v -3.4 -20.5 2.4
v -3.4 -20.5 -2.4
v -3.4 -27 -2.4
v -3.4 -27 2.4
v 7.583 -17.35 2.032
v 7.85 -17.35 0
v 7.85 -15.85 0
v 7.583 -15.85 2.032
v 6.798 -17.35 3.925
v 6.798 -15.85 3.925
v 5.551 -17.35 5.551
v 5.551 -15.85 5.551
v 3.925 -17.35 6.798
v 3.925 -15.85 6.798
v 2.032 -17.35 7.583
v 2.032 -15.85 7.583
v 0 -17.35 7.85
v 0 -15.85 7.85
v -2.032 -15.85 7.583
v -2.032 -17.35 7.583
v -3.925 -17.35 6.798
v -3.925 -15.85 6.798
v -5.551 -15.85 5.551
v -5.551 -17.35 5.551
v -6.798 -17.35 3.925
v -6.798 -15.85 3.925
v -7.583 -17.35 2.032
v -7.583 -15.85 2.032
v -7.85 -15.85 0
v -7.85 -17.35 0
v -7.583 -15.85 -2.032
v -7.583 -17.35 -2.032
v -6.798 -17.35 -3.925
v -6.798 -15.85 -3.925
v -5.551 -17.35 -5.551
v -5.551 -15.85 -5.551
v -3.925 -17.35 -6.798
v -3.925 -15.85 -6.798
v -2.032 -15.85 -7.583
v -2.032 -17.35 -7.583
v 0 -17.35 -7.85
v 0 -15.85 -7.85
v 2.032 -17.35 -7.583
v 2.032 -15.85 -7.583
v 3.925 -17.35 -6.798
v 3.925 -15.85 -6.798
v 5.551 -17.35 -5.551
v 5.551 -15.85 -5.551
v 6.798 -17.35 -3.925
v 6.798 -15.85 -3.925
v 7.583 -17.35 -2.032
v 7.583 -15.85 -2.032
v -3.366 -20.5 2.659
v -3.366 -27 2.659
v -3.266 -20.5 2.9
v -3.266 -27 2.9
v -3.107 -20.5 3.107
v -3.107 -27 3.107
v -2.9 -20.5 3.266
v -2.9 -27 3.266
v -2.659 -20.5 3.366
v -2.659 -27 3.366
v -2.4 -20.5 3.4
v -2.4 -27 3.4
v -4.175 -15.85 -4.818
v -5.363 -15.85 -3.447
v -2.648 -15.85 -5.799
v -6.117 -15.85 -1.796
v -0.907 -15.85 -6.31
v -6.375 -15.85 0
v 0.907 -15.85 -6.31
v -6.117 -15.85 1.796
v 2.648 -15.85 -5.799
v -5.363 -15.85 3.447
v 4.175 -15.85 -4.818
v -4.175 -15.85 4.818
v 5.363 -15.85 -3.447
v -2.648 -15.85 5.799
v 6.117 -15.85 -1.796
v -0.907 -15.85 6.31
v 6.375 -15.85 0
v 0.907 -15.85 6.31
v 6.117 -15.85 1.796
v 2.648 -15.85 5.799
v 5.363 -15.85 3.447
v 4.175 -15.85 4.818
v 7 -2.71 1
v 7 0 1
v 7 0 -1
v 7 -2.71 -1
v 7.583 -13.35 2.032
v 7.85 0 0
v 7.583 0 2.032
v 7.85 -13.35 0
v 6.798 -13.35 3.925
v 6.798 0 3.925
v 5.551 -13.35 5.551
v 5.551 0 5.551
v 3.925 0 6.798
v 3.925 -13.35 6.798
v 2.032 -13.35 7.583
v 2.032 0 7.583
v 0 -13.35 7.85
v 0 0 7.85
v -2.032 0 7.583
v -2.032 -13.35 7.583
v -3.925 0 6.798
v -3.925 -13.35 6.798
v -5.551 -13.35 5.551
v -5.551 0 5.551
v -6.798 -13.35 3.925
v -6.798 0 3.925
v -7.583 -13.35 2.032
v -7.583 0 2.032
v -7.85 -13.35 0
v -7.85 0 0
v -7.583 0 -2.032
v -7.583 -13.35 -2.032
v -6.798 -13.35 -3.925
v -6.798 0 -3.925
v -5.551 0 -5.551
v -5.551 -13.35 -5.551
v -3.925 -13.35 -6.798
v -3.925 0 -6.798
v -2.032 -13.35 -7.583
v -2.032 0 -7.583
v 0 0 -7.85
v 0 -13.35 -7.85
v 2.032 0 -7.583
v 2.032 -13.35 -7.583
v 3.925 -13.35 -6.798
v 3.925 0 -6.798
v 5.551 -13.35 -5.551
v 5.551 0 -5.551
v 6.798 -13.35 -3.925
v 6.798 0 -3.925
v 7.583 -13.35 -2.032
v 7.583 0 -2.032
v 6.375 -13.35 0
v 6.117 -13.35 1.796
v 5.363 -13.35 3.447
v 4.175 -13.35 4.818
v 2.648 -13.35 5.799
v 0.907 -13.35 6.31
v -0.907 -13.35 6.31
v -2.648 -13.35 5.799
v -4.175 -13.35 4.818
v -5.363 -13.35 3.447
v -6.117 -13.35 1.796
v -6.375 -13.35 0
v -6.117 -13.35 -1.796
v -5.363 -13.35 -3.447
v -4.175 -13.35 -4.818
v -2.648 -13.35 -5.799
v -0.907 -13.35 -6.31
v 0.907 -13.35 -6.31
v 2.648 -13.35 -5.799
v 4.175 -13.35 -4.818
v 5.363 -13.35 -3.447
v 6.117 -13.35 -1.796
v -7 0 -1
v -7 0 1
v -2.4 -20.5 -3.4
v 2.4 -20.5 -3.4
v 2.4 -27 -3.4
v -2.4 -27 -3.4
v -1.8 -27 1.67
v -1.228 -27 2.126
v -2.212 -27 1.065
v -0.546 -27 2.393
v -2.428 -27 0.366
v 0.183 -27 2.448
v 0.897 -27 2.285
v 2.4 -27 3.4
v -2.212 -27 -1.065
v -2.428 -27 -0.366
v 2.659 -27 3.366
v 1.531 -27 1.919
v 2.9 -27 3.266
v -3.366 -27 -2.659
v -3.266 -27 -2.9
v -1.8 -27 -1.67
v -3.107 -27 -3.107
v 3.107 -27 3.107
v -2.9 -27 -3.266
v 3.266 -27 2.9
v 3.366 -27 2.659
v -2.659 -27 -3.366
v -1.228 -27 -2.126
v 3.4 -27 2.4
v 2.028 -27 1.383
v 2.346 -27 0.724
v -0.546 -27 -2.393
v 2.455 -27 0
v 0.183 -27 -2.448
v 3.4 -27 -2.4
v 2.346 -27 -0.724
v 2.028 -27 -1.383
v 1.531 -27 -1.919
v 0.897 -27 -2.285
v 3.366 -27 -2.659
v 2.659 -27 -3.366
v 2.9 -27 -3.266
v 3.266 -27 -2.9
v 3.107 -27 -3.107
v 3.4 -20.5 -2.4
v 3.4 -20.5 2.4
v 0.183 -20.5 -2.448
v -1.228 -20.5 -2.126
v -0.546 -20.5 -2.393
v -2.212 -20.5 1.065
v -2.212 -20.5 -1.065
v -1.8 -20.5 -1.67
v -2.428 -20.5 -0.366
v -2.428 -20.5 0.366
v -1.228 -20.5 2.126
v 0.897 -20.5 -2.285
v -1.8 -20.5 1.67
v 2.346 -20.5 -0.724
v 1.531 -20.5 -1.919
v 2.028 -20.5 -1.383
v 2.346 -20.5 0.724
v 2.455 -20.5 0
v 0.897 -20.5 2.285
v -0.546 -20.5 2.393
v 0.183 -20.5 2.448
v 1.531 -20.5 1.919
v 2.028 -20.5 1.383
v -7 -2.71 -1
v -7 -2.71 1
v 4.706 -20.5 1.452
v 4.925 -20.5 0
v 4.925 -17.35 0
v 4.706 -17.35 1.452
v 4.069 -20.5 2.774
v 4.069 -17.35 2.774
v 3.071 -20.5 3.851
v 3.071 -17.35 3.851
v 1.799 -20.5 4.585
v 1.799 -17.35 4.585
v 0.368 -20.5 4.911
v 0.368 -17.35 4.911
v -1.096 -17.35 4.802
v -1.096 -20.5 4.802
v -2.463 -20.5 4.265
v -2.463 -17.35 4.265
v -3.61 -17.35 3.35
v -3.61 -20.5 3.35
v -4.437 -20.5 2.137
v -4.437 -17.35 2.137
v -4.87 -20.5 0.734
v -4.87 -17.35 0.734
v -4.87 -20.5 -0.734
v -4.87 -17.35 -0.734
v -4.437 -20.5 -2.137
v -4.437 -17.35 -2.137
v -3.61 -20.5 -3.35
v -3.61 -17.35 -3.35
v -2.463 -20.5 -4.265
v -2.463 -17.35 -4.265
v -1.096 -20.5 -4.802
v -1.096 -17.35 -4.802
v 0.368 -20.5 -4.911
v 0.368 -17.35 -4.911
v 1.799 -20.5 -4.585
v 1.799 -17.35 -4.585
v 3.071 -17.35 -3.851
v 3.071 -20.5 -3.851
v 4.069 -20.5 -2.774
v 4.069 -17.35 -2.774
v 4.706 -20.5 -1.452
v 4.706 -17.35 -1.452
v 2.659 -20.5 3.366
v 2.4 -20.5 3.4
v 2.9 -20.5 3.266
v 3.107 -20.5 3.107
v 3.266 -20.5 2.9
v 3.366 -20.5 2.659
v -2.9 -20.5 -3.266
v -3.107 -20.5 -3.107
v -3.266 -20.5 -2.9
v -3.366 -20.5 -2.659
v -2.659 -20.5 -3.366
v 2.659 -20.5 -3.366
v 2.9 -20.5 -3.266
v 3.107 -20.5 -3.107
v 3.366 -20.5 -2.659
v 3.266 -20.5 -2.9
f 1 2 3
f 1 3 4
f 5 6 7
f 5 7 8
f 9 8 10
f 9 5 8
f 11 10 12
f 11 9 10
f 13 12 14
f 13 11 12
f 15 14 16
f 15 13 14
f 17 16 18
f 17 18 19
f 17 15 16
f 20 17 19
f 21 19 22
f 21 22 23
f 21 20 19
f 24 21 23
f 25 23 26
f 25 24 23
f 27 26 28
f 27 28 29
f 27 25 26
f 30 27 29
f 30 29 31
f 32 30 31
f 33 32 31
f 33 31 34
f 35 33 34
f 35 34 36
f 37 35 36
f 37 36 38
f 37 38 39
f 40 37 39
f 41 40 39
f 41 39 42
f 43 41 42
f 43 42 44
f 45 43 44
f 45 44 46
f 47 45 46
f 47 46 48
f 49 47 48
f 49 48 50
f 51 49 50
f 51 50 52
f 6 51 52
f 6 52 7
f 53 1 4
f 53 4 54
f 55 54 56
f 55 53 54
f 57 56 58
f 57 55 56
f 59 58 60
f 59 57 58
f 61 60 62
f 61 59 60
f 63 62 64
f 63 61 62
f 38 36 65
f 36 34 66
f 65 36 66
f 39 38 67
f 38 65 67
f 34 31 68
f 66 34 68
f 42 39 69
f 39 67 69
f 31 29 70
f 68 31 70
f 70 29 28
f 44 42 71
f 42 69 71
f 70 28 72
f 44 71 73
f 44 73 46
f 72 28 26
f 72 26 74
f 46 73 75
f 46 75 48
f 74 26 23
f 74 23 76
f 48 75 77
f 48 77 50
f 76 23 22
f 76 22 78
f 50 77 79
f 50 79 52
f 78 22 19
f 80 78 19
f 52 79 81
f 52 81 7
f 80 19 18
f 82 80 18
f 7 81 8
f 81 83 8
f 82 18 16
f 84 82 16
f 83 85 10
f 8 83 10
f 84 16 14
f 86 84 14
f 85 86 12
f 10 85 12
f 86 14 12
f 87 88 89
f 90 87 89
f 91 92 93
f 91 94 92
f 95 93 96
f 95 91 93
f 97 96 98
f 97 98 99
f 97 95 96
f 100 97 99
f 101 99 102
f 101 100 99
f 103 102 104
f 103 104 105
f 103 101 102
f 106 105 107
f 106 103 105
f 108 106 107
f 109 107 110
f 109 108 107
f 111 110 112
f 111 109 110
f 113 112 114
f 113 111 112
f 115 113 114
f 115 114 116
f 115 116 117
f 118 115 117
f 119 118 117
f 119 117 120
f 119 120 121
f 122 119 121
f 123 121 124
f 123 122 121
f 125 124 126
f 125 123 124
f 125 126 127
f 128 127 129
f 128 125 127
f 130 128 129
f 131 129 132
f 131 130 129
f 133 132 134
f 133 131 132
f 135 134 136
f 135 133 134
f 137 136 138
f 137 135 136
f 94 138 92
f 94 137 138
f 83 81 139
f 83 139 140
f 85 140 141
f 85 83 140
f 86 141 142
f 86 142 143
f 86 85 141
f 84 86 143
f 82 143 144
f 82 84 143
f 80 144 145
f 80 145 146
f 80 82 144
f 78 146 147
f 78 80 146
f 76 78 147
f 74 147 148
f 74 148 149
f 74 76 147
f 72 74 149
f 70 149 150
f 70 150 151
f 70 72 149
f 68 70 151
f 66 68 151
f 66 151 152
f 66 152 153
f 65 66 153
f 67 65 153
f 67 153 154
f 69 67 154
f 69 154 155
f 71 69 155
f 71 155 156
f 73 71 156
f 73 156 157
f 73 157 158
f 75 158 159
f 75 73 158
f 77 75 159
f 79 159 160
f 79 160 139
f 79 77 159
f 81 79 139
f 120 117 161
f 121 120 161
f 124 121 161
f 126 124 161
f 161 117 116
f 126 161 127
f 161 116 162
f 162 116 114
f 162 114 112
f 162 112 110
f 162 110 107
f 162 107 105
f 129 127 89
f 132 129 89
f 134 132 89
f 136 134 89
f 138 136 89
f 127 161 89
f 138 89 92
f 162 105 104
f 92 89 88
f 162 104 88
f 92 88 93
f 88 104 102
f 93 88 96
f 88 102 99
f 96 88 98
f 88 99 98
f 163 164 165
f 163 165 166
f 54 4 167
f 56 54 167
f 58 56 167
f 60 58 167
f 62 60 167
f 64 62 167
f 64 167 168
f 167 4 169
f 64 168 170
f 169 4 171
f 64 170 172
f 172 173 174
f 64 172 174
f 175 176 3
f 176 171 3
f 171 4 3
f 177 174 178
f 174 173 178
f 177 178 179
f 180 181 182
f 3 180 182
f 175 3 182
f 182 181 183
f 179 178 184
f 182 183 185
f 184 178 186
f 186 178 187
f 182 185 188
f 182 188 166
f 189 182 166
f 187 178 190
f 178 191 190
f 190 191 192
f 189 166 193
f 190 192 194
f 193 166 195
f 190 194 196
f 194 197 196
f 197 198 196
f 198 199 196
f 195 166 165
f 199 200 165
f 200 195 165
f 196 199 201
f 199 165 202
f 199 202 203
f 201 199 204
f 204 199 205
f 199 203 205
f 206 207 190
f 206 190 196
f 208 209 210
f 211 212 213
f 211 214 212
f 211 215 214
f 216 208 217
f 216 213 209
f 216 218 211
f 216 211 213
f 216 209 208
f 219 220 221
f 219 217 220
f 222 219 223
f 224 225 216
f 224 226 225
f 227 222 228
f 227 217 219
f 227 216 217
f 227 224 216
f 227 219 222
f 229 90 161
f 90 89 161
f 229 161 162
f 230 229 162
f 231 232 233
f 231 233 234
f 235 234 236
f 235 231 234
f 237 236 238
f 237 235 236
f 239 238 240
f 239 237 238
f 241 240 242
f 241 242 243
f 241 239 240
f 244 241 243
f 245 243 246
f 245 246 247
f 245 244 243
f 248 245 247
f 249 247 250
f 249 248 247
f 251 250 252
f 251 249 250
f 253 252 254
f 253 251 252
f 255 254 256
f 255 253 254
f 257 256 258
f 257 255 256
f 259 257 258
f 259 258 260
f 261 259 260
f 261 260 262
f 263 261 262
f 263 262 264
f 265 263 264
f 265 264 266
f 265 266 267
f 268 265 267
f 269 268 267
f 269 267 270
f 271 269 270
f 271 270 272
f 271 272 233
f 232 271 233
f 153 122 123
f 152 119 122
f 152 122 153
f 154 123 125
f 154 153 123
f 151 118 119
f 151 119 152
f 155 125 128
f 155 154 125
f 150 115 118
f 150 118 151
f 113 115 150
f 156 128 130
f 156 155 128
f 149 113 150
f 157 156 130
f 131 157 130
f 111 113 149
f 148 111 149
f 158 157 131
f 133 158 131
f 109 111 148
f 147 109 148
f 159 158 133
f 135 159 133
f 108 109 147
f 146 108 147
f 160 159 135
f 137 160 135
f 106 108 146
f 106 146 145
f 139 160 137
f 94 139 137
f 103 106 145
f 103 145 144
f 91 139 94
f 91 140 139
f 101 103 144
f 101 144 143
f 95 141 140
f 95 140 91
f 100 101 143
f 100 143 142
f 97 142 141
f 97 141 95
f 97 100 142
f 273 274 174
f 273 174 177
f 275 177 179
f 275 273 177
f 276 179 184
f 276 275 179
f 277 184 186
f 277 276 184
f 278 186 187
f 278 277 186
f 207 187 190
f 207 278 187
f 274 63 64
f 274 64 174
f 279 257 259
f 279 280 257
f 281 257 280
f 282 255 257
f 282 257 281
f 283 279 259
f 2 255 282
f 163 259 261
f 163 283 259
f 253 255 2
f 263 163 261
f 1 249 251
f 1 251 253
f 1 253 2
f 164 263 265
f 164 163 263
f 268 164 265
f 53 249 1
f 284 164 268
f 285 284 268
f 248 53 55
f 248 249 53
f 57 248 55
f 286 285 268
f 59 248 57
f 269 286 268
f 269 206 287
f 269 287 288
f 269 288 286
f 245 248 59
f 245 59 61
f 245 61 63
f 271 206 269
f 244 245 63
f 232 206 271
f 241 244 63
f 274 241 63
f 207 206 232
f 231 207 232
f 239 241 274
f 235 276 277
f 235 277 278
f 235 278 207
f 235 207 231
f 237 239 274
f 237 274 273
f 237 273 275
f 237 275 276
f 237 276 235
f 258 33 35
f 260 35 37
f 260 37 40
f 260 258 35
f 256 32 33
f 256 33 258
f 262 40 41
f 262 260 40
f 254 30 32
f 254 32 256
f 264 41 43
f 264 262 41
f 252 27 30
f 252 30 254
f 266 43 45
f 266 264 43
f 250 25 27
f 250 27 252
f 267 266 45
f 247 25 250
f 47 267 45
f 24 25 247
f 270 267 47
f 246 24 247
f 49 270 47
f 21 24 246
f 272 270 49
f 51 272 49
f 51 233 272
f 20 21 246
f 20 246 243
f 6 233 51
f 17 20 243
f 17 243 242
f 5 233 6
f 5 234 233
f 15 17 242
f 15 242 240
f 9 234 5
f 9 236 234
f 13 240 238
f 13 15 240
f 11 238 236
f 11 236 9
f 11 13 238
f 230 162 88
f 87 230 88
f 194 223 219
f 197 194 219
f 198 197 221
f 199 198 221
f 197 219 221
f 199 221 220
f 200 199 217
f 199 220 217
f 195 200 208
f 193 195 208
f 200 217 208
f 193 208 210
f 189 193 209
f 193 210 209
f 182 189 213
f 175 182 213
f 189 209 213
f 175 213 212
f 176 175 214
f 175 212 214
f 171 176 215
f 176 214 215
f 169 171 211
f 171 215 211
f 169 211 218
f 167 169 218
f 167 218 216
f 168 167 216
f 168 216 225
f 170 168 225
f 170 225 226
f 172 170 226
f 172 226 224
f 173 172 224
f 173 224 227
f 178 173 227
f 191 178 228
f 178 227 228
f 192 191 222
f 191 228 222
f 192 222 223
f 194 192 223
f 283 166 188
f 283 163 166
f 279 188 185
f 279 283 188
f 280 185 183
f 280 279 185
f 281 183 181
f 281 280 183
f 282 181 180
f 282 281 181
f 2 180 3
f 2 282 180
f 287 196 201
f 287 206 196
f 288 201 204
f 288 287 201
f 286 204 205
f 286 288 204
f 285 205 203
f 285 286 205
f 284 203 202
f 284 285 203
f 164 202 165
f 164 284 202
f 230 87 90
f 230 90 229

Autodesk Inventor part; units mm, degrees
sketch "Sketch_1" plane through (0, 0, 0) normal (0, 0, 1) x (1, 0, 0)
  line L0 (0, -20.5) -> (0, 0)
  line L1 (0, 0) -> (7.85, 0)
  line L2 (7.85, 0) -> (7.85, -13.35)
  line L3 (7.85, -13.35) -> (6.375, -13.35)
  line L4 (6.375, -13.35) -> (6.375, -15.85)
  line L5 (6.375, -15.85) -> (7.85, -15.85)
  line L6 (7.85, -15.85) -> (7.85, -17.35)
  line L7 (7.85, -17.35) -> (4.925, -17.35)
  line L8 (4.925, -17.35) -> (4.925, -20.5)
  line L9 (4.925, -20.5) -> (0, -20.5)
  line L10 (0, -20.5) -> (0, 0)
revolve "Revolution1" add sketch "Sketch_1" angle 360 about axis through (0, -20.5, 0) along (0, -1, 0)
sketch "Sketch_2" plane through (0, -20.5, 0) normal (0, 1, 0) x (1, 0, 0)
  arc A0 (-3.4, -2.4) -> (-2.4, -3.4) centre (-2.4, -2.4) ccw
  line L0 (-2.4, -3.4) -> (2.4, -3.4)
  arc A1 (2.4, -3.4) -> (3.4, -2.4) centre (2.4, -2.4) ccw
  line L1 (3.4, -2.4) -> (3.4, 2.4)
  arc A2 (3.4, 2.4) -> (2.4, 3.4) centre (2.4, 2.4) ccw
  line L2 (2.4, 3.4) -> (-2.4, 3.4)
  arc A3 (-2.4, 3.4) -> (-3.4, 2.4) centre (-2.4, 2.4) ccw
  line L3 (-3.4, 2.4) -> (-3.4, -2.4)
  circle A4 centre (0, 0) radius 2.455
extrude "Extrusion1" add sketch "Sketch_2" against normal blind 6.5
sketch "Sketch_3" plane through (0, 0, 0) normal (0, 1, 0) x (-1, 0, 0)
  line L0 (7, -1) -> (7, 1)
  line L1 (7, 1) -> (-7, 1)
  line L2 (-7, 1) -> (-7, -1)
  line L3 (-7, -1) -> (7, -1)
extrude "Extrusion2" cut sketch "Sketch_3" against normal blind 2.71
ref_plane "insert_to_lock_XY" through (0, 0, 0) normal (0, 1, 0) x (1, 0, 0)
ref_plane "insert_to_lock_YZ" through (0, 0, 0) normal (1, 0, 0) x (0, 0, -1)
ref_plane "insert_to_lock_ZX" through (0, 0, 0) normal (0, 0, -1) x (0, 1, 0)
properties part number "lock_insert_na"
